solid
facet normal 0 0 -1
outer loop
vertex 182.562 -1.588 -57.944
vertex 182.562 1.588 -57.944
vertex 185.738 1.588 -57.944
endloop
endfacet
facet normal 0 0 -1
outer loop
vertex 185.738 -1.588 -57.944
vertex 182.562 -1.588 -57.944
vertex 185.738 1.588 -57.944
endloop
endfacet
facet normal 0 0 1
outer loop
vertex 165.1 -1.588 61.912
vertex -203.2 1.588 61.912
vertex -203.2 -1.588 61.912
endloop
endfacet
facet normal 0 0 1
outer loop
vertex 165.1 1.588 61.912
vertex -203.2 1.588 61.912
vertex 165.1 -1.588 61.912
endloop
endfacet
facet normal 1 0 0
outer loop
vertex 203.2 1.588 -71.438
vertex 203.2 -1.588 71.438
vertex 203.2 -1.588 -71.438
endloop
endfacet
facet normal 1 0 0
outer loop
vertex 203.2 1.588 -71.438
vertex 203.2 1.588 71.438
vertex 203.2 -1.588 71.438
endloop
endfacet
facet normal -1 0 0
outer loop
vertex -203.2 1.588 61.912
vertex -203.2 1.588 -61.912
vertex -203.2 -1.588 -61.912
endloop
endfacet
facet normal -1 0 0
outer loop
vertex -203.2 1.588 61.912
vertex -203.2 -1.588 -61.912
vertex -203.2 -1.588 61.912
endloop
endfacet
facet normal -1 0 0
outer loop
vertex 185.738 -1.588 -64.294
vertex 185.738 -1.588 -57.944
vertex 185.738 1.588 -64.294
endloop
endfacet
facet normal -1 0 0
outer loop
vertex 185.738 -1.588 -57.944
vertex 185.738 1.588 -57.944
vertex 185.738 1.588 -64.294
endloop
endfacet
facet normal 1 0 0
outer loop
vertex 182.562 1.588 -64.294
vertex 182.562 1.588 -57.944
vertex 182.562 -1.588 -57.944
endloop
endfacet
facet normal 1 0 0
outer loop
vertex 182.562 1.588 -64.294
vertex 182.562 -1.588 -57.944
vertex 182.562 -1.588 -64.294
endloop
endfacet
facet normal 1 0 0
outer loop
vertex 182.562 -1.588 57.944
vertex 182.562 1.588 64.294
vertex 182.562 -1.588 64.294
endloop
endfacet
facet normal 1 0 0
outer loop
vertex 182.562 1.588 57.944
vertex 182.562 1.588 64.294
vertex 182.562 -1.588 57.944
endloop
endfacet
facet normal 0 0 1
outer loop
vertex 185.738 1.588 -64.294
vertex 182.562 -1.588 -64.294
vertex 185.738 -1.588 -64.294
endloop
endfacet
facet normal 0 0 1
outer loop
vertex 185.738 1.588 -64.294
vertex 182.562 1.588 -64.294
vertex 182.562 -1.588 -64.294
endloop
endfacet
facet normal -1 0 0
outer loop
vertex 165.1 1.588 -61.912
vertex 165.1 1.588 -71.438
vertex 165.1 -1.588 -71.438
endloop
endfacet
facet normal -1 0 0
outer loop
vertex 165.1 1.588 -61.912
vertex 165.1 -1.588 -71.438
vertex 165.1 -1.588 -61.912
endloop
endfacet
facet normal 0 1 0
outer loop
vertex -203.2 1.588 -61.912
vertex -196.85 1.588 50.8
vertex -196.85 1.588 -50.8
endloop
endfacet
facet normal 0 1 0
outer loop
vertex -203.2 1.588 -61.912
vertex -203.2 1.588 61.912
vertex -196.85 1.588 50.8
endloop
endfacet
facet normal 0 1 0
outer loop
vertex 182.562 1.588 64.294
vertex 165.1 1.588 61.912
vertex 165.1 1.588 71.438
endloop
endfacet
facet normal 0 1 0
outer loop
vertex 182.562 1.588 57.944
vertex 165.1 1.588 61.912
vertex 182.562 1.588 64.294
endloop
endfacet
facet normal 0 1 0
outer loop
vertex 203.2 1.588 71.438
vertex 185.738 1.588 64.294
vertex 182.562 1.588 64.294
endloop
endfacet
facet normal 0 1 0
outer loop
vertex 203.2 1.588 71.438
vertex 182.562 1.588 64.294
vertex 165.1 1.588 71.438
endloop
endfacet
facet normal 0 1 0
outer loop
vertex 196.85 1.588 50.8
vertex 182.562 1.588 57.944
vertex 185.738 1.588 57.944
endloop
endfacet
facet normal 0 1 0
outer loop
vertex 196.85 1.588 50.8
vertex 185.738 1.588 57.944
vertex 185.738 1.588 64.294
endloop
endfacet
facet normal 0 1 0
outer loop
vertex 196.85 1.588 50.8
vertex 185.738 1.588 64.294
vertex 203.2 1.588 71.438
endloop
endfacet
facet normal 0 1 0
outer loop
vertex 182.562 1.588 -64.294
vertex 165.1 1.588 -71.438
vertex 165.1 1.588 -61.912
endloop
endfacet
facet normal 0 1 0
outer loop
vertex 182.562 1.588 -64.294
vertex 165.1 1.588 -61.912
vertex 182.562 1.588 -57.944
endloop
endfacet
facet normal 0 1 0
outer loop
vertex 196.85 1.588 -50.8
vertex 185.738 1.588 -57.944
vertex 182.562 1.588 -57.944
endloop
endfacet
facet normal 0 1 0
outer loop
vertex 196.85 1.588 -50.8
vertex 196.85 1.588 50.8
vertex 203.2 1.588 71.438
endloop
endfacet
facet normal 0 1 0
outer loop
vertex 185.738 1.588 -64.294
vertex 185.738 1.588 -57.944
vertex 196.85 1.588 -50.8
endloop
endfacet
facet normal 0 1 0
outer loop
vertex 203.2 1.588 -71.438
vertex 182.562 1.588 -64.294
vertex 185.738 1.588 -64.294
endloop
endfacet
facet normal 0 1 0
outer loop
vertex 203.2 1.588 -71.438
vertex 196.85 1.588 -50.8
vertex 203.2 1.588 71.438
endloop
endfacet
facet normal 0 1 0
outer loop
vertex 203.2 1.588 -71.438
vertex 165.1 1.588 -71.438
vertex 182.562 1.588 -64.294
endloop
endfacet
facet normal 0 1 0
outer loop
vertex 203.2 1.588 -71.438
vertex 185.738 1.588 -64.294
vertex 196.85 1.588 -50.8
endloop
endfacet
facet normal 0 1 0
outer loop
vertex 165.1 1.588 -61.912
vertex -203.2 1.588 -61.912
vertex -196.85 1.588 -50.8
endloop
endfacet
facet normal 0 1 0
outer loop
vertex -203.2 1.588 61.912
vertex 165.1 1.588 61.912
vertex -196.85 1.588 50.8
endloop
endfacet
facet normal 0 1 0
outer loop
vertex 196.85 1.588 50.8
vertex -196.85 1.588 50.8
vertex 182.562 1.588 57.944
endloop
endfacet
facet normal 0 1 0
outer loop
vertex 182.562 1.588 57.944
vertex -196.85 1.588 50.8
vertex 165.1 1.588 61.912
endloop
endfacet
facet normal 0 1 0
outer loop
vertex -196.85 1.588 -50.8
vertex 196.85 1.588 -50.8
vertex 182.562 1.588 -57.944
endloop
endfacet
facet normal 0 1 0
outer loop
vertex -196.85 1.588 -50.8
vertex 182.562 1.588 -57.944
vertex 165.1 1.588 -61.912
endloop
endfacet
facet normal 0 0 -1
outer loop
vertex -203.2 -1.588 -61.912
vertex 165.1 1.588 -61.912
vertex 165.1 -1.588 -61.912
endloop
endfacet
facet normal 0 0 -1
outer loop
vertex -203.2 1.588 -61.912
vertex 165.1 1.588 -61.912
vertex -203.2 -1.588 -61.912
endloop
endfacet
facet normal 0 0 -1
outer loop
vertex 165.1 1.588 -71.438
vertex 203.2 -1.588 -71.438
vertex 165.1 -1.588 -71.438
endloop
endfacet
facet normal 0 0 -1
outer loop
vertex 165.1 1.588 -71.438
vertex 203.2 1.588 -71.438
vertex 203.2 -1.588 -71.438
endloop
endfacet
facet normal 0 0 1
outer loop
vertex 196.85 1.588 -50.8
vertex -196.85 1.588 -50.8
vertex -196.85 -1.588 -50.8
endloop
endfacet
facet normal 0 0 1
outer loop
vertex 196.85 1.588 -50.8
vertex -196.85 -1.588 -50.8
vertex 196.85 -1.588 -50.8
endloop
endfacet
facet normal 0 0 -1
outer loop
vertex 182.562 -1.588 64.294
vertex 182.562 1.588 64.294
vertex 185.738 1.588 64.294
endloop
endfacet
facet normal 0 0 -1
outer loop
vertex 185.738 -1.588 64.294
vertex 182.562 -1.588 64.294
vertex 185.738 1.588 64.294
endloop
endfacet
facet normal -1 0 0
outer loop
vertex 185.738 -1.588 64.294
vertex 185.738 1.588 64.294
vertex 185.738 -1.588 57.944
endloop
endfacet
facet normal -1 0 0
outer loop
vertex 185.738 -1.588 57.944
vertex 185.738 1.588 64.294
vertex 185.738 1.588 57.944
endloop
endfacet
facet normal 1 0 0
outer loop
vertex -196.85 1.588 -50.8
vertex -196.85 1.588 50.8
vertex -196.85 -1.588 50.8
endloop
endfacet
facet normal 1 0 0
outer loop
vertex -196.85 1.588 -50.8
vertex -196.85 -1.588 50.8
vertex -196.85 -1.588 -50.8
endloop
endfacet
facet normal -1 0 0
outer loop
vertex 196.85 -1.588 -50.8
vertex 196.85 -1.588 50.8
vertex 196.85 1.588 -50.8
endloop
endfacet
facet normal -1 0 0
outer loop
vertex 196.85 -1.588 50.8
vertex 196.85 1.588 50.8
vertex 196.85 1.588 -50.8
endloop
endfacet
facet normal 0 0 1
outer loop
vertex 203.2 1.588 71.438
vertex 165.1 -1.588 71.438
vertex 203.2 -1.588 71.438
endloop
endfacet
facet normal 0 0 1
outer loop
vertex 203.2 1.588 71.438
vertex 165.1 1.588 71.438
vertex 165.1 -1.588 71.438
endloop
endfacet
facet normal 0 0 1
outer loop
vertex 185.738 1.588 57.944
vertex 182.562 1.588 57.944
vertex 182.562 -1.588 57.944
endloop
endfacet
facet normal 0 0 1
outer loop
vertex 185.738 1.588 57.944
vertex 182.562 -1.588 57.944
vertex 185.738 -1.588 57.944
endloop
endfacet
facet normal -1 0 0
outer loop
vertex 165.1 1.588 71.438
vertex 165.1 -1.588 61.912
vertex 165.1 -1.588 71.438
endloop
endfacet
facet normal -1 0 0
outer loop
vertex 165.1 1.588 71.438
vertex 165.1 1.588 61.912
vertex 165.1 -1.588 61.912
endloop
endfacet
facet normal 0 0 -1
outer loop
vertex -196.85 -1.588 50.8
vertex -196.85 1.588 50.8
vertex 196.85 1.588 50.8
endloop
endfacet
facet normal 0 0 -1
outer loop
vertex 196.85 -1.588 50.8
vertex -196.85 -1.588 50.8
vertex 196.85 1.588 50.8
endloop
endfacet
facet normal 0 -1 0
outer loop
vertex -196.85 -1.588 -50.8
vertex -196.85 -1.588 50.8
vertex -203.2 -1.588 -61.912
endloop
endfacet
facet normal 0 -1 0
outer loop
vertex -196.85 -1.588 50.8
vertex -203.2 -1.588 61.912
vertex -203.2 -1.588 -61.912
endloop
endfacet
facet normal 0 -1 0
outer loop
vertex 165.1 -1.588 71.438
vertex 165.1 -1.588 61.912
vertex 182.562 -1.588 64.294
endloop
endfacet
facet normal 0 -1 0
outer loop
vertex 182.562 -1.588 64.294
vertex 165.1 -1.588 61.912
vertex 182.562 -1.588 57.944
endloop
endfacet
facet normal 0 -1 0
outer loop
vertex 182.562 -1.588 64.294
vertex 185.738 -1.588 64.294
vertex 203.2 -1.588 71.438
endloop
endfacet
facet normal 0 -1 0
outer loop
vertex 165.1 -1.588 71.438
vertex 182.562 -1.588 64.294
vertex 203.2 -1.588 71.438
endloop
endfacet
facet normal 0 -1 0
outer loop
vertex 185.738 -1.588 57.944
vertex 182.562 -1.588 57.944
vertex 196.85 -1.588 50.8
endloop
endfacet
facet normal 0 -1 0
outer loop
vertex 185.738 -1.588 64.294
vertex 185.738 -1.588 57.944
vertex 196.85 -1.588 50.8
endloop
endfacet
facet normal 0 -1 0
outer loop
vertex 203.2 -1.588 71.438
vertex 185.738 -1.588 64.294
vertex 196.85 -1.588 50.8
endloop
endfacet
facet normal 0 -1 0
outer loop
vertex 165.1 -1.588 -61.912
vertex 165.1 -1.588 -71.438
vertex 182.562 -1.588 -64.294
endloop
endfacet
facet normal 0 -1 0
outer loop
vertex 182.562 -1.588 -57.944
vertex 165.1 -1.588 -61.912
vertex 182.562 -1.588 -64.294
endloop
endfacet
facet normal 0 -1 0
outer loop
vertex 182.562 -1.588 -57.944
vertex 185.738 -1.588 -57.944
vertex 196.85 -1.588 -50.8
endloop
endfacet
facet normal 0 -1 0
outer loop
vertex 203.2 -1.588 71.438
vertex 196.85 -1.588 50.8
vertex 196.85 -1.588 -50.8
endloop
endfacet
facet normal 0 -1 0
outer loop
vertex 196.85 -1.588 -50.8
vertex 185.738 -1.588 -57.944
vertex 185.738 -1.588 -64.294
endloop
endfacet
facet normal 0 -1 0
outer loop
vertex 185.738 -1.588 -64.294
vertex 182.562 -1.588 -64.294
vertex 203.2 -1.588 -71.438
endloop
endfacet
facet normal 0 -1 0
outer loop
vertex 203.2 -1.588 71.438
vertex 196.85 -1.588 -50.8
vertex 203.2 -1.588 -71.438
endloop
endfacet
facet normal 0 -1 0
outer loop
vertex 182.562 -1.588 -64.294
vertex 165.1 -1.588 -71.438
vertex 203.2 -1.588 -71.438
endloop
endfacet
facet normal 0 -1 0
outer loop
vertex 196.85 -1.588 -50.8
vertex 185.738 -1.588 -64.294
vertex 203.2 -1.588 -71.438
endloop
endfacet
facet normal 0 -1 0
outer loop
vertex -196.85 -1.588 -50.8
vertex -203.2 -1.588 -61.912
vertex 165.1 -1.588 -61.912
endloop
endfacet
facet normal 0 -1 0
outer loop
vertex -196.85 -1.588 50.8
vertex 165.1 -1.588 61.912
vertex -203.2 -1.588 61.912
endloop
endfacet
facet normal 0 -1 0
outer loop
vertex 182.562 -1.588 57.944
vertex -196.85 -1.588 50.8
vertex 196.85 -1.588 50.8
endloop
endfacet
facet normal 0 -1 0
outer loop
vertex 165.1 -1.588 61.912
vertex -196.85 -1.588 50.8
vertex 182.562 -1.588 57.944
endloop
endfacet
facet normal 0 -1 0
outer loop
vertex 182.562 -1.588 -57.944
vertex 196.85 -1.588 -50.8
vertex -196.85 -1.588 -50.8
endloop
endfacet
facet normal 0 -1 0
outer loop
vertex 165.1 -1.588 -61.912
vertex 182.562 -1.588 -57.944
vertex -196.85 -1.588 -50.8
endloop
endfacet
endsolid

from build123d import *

# Parameters (mm, degrees)
SKETCH1_W           = 3.175
SKETCH1_H           = 6.35
SKETCH1_W_2         = 393.7
SKETCH1_H_2         = 101.6
BOSS_EXTRUDE1_DEPTH = 1.5875


with BuildPart() as part:
    # Sketch1 → Boss-Extrude1 (new body, symmetric)
    with BuildSketch(Plane(origin=(0, 0, 0), x_dir=(1, 0, 0), z_dir=(0, 1, 0))):
        Polygon((203.2, 71.4375), (165.1, 71.4375), (165.1, 61.9125), (-203.2, 61.9125), (-203.2, 50.8), (-203.2, -50.8), (-203.2, -61.9125), (165.1, -61.9125), (165.1, -71.4375), (203.2, -71.4375), (203.2, -50.8), (203.2, 50.8), align=None)
        with Locations((184.15, -61.11875)):
            Rectangle(SKETCH1_W, SKETCH1_H, mode=Mode.SUBTRACT)
        Rectangle(SKETCH1_W_2, SKETCH1_H_2, mode=Mode.SUBTRACT)
        with Locations((184.15, 61.11875)):
            Rectangle(SKETCH1_W, SKETCH1_H, mode=Mode.SUBTRACT)
    extrude(amount=BOSS_EXTRUDE1_DEPTH, both=True)


solid = part.part
